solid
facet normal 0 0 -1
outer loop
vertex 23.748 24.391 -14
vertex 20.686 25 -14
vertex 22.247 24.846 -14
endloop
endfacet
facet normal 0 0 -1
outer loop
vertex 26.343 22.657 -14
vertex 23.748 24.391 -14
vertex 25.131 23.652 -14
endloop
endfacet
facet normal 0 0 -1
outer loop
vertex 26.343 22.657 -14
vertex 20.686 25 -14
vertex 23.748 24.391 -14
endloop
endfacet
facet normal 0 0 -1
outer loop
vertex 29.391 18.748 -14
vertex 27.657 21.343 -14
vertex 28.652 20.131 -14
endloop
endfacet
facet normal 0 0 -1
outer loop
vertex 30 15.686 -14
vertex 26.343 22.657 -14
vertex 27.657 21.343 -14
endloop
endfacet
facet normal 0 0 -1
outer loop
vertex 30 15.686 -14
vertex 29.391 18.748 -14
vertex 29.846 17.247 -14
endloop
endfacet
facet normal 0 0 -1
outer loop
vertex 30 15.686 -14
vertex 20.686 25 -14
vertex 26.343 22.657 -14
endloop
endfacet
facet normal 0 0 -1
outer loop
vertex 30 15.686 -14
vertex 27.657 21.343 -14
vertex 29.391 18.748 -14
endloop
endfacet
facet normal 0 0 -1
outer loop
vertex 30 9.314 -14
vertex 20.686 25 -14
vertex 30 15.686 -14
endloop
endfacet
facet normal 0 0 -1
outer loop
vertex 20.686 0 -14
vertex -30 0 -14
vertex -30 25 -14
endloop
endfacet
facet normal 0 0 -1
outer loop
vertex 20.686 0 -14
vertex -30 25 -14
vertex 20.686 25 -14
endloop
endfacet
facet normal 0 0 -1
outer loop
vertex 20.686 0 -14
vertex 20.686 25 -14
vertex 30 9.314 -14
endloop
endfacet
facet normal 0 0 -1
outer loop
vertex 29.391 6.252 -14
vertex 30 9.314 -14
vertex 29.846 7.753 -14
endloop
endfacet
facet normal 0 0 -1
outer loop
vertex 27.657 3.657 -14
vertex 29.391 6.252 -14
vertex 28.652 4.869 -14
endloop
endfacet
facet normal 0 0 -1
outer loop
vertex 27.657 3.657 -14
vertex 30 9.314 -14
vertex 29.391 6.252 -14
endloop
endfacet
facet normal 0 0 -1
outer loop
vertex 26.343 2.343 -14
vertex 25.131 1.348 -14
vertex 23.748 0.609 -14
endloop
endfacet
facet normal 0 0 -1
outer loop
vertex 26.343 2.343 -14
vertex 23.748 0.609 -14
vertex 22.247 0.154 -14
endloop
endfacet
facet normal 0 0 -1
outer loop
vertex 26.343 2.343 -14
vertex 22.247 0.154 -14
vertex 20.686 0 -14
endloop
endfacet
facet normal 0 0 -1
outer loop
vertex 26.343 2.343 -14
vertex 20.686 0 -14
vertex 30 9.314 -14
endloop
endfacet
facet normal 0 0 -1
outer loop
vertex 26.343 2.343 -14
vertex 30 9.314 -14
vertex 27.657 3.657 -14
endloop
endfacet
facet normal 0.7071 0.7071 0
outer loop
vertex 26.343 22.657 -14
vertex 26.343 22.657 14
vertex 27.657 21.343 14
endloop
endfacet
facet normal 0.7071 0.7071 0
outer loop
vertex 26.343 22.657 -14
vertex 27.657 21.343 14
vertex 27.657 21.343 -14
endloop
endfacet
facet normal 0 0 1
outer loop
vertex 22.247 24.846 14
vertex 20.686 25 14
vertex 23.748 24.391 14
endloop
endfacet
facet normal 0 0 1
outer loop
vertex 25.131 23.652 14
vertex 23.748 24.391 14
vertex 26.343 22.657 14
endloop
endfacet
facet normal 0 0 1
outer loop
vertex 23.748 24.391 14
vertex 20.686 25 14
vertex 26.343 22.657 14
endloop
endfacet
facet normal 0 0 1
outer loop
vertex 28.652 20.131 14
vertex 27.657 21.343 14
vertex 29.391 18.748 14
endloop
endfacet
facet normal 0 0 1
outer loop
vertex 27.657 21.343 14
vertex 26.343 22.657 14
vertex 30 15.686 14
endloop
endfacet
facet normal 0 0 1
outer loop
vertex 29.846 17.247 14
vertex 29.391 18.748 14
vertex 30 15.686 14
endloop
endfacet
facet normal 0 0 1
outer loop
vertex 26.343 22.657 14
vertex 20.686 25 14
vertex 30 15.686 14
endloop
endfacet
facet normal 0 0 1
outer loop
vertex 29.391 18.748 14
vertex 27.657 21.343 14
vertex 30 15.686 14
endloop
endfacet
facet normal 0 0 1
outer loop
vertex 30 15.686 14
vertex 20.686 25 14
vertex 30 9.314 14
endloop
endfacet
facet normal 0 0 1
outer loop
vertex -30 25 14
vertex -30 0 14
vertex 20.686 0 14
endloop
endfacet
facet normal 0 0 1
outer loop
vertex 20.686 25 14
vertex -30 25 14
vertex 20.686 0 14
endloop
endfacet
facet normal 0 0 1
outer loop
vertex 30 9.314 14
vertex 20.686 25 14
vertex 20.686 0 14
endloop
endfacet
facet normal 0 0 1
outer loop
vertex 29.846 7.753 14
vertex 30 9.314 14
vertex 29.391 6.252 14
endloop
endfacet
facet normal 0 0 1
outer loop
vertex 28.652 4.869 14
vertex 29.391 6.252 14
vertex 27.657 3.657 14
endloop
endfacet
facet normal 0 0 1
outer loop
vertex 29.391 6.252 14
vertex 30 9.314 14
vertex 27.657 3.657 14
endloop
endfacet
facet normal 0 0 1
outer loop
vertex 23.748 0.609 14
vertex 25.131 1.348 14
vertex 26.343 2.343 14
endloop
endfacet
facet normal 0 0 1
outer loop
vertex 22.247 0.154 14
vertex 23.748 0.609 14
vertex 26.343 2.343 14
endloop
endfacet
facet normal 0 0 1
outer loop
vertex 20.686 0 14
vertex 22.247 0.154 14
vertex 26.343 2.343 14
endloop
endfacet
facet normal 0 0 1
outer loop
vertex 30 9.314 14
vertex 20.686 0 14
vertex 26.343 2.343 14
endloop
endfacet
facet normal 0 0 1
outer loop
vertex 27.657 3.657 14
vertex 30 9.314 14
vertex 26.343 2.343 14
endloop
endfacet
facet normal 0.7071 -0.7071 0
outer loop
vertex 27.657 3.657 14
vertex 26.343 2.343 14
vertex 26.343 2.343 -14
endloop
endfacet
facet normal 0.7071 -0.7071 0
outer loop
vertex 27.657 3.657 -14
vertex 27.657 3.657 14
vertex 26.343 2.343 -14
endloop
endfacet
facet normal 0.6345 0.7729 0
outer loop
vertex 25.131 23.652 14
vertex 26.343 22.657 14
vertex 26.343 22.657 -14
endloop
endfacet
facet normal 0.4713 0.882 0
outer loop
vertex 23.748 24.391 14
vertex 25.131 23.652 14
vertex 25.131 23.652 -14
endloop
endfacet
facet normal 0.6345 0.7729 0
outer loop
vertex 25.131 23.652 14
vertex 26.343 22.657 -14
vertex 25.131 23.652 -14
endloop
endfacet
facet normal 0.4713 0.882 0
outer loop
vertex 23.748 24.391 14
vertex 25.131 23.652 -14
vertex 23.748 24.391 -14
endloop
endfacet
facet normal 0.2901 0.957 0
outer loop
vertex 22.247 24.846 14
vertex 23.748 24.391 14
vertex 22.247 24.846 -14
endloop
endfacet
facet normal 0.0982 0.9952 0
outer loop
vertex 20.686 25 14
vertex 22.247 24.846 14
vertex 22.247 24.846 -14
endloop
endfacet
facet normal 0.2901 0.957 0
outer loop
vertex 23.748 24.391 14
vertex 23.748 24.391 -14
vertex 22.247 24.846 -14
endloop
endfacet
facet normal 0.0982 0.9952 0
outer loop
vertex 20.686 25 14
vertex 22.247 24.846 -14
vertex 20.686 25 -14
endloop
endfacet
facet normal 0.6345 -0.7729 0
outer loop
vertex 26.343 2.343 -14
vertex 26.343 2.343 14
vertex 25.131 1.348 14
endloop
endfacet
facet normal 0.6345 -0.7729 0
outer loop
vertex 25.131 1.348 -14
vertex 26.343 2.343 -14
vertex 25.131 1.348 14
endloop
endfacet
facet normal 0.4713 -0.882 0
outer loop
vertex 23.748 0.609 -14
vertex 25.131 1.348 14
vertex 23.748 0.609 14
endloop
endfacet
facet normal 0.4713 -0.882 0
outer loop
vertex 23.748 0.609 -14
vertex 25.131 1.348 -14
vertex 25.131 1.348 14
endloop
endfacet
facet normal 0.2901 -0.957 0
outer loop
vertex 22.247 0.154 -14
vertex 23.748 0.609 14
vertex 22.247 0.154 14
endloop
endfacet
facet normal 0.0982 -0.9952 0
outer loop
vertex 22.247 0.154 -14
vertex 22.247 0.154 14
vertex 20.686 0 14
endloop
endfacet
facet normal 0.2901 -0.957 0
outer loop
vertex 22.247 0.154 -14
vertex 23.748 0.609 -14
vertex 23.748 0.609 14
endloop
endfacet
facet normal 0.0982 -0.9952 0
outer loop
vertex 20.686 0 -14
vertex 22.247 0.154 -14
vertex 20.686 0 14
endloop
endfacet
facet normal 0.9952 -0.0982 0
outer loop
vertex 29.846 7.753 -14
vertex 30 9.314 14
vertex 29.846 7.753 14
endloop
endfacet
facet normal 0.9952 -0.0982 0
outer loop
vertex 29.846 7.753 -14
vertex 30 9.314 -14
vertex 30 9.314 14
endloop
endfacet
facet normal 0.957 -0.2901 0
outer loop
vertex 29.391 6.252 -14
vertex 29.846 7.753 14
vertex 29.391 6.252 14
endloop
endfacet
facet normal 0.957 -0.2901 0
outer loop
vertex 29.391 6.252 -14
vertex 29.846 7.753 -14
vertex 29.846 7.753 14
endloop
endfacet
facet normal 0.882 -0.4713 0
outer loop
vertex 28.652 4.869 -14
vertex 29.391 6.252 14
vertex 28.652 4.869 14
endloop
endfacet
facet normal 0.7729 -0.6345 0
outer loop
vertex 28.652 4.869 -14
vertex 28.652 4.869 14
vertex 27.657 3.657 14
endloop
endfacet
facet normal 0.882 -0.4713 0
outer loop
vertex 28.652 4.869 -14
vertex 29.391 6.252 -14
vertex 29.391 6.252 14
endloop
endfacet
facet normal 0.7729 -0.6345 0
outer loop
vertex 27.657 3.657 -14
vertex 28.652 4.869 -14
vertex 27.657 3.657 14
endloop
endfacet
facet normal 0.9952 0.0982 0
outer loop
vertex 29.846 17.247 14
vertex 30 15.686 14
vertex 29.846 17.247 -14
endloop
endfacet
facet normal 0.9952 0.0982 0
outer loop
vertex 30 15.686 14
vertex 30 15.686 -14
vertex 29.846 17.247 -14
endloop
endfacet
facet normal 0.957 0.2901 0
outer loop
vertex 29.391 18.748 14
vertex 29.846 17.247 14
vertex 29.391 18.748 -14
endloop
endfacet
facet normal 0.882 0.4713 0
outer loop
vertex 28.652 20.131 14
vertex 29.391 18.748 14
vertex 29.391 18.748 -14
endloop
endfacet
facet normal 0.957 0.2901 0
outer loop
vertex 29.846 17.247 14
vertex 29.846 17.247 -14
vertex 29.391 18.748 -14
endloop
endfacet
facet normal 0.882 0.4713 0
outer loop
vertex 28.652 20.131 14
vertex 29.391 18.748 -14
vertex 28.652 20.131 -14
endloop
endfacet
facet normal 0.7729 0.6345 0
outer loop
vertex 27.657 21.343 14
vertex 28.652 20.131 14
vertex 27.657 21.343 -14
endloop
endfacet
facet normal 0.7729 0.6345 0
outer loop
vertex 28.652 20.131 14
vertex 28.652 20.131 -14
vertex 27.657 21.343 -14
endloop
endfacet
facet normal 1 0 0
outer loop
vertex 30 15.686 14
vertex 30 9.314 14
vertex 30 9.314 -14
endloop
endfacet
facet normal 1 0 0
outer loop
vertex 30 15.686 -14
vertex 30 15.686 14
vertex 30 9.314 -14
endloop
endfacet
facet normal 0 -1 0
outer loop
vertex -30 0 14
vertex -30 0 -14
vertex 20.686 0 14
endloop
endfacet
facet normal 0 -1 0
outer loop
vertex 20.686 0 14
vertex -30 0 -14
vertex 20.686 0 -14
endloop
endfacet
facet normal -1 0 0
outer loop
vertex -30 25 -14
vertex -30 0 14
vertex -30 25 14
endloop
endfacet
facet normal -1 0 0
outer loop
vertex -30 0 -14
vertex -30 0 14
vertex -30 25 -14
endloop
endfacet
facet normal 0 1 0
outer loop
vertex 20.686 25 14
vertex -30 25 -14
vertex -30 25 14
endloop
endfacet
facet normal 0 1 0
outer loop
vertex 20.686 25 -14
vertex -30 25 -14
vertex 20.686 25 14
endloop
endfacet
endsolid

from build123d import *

# Parameters (mm, degrees)
SKETCH2_W           = 60
SKETCH2_H           = 28
BOSS_EXTRUDE1_DEPTH = 25
CHAMFER1_SIZE       = 6
FILLET1_R           = 8
FILLET2_R           = 8


with BuildPart() as part:
    # Sketch2 → Boss-Extrude1 (new body)
    with BuildSketch(Plane(origin=(0, 0, 0), x_dir=(1, 0, 0), z_dir=(0, 1, 0))):
        Rectangle(SKETCH2_W, SKETCH2_H)
    extrude(amount=BOSS_EXTRUDE1_DEPTH)

    # Chamfer1
    chamfer1_edges = [part.edges().sort_by_distance(p)[0] for p in [
        (30, 25, 0),
        (30, 0, 0),
    ]]
    chamfer(chamfer1_edges, length=CHAMFER1_SIZE)

    # Fillet1
    fillet1_edges = [part.edges().sort_by_distance(p)[0] for p in [
        (30, 19, 0),
        (30, 6, 0),
    ]]
    fillet(fillet1_edges, radius=FILLET1_R)

    # Fillet2
    fillet2_edges = [part.edges().sort_by_distance(p)[0] for p in [
        (24, 0, 0),
        (24, 25, 0),
    ]]
    fillet(fillet2_edges, radius=FILLET2_R)


solid = part.part
